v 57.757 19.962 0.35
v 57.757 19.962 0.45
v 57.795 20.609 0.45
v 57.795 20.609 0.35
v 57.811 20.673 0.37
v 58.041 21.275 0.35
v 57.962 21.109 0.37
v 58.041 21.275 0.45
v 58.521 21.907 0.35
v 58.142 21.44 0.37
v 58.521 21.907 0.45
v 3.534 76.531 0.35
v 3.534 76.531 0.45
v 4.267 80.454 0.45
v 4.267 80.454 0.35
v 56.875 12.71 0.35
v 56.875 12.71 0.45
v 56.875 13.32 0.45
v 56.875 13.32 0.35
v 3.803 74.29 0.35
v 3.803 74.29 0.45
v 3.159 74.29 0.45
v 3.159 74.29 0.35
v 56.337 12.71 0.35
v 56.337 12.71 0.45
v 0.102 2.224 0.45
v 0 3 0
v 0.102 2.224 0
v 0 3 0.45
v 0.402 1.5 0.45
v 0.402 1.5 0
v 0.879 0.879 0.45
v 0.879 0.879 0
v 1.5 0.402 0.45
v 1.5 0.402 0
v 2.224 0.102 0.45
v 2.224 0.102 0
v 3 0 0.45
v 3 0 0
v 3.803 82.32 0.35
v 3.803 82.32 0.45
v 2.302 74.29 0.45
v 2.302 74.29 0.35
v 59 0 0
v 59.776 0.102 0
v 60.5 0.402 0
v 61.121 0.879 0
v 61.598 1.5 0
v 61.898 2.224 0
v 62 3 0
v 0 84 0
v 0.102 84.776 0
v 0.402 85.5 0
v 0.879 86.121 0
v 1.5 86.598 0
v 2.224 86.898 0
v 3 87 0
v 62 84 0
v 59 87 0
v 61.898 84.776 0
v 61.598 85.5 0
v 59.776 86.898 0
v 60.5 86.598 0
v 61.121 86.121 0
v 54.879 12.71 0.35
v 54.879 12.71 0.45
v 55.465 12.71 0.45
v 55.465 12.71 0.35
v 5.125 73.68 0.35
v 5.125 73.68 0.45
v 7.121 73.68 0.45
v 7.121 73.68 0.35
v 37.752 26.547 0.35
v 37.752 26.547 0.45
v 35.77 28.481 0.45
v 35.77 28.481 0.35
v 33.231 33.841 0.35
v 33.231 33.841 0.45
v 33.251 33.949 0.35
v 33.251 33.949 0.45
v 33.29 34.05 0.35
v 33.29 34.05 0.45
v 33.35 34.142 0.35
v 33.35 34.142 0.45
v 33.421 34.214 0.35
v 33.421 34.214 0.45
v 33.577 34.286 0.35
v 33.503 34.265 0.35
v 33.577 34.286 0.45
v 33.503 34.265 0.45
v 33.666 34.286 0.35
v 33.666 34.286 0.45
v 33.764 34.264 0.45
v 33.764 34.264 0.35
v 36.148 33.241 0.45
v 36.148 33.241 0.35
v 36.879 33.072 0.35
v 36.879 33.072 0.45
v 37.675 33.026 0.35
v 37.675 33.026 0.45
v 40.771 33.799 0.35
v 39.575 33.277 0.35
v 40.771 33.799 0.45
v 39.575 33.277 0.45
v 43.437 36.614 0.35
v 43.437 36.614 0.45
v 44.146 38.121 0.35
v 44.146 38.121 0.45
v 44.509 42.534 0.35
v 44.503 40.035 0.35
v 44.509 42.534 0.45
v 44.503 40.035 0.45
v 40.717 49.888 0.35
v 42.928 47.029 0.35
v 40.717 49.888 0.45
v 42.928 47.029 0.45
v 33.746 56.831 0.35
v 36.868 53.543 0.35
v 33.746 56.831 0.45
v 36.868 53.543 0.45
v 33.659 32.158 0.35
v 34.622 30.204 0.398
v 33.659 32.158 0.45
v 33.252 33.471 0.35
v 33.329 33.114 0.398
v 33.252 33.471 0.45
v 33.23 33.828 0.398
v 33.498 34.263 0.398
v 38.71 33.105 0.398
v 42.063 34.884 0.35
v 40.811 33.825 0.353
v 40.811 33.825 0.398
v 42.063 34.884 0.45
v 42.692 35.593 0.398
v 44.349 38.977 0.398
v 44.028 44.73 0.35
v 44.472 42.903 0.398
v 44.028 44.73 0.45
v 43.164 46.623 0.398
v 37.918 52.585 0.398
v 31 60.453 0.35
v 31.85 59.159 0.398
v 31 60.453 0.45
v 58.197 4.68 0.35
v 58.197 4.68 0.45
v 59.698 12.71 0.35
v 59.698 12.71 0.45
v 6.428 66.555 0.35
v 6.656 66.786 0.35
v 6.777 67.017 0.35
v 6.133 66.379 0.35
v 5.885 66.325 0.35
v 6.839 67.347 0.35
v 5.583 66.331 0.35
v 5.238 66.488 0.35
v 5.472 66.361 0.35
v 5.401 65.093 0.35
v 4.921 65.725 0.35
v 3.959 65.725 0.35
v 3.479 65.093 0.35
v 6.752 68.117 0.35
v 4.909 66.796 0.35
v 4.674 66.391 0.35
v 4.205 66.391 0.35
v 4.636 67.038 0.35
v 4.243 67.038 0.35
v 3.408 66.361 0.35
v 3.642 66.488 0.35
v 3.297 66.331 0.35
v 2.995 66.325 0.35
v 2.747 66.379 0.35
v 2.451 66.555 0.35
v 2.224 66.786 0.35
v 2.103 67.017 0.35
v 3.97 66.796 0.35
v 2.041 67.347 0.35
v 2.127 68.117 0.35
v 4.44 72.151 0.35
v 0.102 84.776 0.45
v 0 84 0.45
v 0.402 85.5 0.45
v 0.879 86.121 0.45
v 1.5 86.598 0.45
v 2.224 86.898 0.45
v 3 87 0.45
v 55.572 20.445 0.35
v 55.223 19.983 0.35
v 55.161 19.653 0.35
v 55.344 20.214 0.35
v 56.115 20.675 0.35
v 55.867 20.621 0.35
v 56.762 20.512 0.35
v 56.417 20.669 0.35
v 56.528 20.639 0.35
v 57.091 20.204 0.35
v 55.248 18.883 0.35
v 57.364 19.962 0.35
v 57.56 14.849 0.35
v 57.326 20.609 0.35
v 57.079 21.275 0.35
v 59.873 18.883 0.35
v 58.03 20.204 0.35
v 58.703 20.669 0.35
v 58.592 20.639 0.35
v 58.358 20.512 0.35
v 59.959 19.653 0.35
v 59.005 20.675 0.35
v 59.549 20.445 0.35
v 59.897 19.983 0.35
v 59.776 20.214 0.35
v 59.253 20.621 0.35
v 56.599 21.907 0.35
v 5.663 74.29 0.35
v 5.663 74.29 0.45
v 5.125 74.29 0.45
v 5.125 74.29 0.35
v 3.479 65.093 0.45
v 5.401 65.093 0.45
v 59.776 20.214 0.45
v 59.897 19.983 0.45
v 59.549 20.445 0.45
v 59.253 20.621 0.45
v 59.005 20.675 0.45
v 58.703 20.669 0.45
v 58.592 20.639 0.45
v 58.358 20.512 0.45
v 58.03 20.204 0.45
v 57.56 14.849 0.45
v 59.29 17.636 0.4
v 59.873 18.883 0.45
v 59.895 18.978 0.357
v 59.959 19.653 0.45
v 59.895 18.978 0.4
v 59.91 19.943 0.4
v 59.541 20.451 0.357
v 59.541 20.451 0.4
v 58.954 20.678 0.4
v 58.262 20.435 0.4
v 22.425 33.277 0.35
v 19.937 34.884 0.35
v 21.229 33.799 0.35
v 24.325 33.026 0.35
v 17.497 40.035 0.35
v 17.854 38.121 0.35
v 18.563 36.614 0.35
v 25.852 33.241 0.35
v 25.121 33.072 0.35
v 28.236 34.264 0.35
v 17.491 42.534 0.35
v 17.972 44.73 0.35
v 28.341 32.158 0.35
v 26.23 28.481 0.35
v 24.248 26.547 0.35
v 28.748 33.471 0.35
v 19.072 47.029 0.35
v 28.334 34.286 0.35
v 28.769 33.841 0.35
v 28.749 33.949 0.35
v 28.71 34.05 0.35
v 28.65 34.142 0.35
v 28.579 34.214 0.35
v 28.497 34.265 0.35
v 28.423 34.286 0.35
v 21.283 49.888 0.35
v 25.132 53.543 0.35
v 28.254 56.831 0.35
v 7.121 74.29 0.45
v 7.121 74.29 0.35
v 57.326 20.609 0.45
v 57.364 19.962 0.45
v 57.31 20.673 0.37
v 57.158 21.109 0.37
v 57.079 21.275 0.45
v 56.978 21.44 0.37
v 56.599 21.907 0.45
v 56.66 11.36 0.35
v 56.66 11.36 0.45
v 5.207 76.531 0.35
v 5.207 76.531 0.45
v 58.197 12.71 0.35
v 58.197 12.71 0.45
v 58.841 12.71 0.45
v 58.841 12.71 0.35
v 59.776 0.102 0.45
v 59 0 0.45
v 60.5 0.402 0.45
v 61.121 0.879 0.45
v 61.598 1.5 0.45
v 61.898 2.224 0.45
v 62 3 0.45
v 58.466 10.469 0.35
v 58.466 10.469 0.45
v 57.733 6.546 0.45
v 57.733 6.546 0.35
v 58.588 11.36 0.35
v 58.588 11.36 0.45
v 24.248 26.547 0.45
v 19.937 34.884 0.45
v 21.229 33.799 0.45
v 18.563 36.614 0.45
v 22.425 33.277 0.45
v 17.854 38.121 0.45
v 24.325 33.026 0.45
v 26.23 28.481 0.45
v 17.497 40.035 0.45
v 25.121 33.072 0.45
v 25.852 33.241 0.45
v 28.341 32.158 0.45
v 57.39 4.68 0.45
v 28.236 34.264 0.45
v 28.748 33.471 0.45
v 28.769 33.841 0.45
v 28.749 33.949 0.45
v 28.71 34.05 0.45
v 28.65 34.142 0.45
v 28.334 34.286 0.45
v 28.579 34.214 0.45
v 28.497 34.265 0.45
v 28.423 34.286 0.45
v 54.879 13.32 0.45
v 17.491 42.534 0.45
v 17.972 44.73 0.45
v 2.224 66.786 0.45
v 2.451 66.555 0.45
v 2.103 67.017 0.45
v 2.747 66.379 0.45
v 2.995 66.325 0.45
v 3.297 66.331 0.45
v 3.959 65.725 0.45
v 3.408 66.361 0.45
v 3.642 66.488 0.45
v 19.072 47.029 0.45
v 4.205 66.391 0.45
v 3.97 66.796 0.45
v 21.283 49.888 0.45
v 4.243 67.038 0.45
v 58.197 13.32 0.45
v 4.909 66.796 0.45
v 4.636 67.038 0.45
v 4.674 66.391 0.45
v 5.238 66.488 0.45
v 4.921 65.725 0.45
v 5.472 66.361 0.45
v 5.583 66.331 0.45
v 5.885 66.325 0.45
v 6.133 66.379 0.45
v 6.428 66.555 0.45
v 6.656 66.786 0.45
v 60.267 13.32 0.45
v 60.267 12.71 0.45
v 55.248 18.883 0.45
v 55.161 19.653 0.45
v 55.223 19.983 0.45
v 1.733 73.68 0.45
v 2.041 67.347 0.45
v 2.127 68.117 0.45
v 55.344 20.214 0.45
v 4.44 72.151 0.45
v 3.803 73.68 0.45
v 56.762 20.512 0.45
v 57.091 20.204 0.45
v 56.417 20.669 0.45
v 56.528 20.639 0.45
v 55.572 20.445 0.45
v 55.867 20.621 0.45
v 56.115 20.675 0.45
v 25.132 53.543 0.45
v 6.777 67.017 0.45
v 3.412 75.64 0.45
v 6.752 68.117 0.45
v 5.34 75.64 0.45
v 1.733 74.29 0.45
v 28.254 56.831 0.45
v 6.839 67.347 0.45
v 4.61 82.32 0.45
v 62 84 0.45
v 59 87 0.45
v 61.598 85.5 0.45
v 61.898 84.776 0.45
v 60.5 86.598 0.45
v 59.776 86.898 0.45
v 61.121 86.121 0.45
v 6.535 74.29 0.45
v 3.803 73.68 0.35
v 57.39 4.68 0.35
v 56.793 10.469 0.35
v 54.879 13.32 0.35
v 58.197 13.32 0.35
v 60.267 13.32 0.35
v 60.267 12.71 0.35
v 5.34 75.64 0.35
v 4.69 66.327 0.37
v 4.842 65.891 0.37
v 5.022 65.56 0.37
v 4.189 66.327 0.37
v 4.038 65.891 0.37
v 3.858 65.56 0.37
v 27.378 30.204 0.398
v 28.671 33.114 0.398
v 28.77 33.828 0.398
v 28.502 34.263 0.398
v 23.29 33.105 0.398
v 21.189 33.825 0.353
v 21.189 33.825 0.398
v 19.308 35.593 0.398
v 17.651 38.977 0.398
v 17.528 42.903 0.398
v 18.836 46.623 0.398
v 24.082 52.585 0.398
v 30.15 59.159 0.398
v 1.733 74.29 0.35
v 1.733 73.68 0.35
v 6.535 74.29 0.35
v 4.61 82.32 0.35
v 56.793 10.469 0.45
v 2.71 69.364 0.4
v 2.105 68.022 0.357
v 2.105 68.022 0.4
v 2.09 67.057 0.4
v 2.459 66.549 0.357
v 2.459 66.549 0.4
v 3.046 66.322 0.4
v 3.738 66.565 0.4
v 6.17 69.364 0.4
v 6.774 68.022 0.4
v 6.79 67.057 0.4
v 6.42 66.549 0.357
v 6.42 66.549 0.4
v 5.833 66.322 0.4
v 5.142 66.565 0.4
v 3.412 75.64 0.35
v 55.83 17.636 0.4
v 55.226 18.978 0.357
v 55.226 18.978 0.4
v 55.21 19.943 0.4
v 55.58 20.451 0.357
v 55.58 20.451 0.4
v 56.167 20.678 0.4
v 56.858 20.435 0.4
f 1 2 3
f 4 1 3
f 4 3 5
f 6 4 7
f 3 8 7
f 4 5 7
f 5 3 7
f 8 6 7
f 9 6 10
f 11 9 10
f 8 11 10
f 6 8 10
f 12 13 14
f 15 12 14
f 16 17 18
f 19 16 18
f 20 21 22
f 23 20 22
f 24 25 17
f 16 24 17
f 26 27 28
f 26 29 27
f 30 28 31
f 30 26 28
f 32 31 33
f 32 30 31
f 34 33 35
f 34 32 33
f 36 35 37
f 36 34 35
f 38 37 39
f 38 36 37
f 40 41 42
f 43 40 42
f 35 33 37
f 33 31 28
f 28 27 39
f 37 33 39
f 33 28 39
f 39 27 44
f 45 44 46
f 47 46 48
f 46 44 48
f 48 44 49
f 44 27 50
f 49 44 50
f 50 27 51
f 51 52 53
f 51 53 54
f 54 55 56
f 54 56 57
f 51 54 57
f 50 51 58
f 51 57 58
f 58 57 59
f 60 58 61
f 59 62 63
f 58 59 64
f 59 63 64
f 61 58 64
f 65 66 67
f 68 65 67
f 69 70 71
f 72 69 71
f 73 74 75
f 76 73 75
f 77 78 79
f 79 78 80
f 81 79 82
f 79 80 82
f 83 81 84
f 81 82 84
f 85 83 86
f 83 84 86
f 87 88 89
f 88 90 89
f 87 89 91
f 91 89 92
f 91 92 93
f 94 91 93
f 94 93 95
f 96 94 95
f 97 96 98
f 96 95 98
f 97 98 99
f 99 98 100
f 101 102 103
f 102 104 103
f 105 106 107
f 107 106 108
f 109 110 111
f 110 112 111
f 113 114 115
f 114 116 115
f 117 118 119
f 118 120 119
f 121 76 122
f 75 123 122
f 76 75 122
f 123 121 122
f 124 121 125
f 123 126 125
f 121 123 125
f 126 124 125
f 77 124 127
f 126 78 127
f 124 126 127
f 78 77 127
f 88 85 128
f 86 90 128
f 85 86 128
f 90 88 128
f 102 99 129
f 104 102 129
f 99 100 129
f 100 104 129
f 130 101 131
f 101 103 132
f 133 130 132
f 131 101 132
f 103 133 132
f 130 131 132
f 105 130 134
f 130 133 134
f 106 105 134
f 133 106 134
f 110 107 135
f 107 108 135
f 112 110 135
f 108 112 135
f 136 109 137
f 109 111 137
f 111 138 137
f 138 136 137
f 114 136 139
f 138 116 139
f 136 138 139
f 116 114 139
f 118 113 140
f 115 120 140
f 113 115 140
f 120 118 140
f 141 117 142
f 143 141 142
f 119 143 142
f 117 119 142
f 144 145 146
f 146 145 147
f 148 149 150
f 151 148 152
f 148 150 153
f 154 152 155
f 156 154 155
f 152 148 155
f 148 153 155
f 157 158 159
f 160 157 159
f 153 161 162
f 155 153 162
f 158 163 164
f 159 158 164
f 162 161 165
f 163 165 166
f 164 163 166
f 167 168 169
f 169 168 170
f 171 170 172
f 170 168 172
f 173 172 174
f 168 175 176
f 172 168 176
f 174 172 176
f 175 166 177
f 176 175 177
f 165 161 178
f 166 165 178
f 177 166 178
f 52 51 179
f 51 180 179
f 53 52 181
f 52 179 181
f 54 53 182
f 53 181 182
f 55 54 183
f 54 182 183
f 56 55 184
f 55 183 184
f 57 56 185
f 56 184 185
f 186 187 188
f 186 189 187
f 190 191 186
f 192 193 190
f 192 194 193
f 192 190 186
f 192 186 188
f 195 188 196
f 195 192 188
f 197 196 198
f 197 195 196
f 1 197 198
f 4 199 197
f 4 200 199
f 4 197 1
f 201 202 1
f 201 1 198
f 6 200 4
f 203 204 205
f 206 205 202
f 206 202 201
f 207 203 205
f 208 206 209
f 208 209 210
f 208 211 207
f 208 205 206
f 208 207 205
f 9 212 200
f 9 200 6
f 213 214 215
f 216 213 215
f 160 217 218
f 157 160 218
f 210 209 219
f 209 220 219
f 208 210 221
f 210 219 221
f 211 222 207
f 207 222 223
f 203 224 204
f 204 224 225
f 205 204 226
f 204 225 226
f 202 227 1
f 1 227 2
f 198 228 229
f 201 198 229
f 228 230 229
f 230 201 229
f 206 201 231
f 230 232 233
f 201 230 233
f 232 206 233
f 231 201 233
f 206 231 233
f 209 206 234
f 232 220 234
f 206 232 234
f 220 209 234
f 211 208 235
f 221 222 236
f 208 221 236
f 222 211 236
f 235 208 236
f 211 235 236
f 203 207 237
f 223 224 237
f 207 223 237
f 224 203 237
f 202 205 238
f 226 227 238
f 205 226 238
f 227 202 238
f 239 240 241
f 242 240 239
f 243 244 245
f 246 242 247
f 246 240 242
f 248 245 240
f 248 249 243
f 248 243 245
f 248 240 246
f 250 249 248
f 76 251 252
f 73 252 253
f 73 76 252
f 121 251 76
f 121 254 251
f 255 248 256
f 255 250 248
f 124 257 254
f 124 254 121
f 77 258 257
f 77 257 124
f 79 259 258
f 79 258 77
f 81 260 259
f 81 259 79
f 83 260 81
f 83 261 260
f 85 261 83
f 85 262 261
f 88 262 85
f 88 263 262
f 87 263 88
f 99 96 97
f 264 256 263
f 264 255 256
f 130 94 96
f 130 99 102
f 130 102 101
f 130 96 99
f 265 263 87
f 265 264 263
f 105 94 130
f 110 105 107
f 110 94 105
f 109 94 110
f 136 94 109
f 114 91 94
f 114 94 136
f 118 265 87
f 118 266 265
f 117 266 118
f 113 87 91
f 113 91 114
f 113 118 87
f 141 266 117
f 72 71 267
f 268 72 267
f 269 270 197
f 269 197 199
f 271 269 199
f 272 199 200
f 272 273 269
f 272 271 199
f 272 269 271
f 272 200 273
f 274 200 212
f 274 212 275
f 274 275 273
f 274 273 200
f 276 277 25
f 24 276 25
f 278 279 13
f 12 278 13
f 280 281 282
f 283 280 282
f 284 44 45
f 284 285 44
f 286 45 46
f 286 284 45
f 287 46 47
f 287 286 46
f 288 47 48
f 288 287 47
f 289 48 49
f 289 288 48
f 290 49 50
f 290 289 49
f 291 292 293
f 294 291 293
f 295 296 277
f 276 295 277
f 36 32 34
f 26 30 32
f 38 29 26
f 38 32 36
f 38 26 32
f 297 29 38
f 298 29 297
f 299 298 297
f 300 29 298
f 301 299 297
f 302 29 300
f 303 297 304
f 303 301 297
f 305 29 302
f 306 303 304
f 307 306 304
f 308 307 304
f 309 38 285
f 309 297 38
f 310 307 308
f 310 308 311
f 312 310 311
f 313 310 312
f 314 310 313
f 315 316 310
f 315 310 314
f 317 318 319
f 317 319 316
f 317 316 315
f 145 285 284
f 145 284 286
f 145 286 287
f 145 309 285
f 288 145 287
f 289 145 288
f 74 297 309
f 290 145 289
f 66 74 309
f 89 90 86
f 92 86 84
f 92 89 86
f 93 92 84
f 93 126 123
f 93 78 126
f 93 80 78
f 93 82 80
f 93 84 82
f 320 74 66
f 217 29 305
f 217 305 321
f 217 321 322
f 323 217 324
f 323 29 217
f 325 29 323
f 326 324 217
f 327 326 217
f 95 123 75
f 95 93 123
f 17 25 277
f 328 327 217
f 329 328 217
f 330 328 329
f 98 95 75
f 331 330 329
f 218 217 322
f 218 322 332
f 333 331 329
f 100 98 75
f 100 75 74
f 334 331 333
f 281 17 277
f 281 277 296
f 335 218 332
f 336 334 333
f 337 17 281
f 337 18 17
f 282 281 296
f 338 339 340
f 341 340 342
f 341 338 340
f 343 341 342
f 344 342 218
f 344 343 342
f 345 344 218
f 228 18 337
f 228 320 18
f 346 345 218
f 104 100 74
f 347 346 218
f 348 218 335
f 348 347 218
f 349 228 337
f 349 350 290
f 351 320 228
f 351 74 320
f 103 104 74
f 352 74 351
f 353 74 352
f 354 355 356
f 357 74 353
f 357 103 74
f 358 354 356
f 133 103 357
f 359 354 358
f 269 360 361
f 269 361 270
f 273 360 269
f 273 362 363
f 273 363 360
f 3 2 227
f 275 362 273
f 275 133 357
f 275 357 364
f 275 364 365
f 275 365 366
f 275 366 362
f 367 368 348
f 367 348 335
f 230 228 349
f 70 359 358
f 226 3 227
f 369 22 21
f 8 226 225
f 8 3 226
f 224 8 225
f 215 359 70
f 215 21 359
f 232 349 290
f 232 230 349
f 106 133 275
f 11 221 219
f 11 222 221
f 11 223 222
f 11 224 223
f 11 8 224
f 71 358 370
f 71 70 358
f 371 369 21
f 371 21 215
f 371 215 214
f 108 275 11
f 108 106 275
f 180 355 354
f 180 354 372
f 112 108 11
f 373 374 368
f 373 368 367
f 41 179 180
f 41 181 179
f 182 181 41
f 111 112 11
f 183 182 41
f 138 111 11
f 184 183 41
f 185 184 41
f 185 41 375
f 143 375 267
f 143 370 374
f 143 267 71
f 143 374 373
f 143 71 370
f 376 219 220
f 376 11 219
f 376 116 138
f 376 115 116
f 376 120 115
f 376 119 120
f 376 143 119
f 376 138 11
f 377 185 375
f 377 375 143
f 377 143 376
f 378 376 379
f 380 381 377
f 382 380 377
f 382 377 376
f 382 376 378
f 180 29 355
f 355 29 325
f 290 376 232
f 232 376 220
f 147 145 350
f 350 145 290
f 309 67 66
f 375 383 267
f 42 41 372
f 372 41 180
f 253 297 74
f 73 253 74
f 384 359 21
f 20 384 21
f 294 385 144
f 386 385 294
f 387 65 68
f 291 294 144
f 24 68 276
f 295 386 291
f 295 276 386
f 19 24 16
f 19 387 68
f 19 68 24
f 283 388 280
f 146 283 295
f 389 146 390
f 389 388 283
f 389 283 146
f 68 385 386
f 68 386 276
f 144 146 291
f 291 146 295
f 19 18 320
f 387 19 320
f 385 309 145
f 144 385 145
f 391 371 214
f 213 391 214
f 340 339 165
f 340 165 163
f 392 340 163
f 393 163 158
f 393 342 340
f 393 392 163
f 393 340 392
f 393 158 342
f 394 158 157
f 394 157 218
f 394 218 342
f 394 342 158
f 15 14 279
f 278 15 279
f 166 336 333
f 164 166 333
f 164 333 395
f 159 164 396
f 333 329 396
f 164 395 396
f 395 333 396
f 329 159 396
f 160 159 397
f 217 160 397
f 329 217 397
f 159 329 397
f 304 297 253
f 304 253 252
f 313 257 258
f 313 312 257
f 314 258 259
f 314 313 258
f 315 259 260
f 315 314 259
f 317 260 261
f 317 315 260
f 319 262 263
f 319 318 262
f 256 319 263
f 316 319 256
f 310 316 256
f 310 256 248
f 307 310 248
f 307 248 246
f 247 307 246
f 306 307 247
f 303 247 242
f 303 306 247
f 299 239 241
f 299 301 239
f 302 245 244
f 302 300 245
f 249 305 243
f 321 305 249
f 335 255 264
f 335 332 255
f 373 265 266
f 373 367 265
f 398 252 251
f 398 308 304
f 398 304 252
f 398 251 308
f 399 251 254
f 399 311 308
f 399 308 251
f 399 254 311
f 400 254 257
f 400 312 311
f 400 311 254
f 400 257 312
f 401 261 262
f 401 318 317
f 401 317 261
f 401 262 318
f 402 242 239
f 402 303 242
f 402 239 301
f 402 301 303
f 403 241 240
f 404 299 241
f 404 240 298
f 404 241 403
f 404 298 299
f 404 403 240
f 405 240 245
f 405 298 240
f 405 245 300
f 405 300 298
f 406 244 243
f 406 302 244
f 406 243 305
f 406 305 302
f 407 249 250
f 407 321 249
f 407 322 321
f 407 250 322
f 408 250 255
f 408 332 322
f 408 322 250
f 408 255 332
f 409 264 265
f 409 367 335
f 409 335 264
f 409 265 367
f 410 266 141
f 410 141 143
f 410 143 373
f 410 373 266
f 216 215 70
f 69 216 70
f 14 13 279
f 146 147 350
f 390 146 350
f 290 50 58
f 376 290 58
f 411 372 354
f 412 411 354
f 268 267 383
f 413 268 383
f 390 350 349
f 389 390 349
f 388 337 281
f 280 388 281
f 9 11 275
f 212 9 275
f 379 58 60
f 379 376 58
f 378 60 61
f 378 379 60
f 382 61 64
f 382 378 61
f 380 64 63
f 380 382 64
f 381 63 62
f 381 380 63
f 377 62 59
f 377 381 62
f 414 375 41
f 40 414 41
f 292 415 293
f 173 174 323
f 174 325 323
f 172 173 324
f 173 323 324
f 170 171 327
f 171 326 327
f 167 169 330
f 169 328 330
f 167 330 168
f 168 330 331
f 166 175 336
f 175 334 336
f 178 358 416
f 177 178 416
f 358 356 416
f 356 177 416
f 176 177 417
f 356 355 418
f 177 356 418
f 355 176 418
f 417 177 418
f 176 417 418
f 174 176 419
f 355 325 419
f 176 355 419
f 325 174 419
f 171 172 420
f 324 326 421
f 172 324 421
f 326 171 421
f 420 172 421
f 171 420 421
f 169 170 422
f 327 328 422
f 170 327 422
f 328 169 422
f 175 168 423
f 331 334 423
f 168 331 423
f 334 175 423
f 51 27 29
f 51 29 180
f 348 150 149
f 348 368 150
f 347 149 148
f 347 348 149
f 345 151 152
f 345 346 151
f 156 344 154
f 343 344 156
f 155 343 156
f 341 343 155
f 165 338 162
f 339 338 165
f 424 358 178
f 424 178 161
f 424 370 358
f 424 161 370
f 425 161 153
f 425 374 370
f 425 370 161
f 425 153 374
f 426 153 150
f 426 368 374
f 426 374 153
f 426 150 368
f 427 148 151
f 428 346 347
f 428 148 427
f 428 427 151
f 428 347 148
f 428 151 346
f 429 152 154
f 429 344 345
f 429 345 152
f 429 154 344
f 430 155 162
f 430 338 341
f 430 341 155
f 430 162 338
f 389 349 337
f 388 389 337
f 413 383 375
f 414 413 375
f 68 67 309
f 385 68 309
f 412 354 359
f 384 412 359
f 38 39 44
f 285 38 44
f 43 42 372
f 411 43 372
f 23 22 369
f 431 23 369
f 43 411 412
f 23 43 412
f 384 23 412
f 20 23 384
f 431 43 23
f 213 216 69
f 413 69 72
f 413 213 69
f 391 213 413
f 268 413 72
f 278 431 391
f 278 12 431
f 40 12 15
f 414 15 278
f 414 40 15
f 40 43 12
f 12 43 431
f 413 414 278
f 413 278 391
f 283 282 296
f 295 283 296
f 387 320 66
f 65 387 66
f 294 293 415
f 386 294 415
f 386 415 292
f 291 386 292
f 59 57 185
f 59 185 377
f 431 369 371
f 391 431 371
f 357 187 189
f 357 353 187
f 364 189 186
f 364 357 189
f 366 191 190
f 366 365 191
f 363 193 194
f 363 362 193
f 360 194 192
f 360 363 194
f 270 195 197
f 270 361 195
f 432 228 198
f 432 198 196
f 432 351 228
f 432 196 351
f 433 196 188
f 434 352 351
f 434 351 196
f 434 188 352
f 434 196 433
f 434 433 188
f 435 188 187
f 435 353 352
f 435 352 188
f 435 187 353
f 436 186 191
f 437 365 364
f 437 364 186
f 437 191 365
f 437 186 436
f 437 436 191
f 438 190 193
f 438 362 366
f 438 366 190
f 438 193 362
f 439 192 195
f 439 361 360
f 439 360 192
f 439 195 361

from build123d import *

# Parameters (mm, degrees)
F0_W     = 62
F0_H     = 87
F1_DEPTH = 0.45
F2_R     = 3
F4_DEPTH = 0.1


with BuildPart() as f1:
    # F0 (on Top) → F1 (new body)
    with BuildSketch(Plane.XY):
        with Locations((31, 43.5)):
            Rectangle(F0_W, F0_H)
    extrude(amount=F1_DEPTH)

    # F2
    f2_edges = [f1.edges().sort_by_distance(p)[0] for p in [
        (62, 87, 0.225),
        (0, 87, 0.225),
        (62, 0, 0.225),
        (0, 0, 0.225),
    ]]
    fillet(f2_edges, radius=F2_R)

    # F3 (on face) → F4 (cut)
    with BuildSketch(Plane.XY.offset(0.45)):
        Polygon((4.6103941277, 82.3198705912), (3.8031477015, 82.3198705912), (2.3018923596, 74.2900818586), (1.7328544054, 74.2900818586), (1.7328544054, 73.6795067787), (3.8031477015, 73.6795067787), (3.8031477015, 74.2900818586), (3.1593375381, 74.2900818586), (3.4117235232, 75.6400228596), (5.3396950772, 75.6400228596), (5.6632163674, 74.2900818586), (5.1254248247, 74.2900818586), (5.1254248247, 73.6795067787), (7.1211797185, 73.6795067787), (7.1211797185, 74.2900818586), (6.5347801634, 74.2900818586), align=None)
        Polygon((4.2673139068, 80.4538051702), (5.2073942497, 76.5311792493), (4.2673139068, 76.5311792493), (3.5339368137, 76.5311792493), align=None, mode=Mode.SUBTRACT)
        with BuildLine():
            add(Edge.make_bspline(
                [(4.4397576712, 72.1507370472), (4.8369145501, 71.5068902989), (5.5292855369, 70.3844602664), (6.1555231929, 69.4098889942), (6.6107708272, 68.5842755704), (6.789836569, 68.0432823133), (6.8610545111, 67.4412662849), (6.8098761533, 67.0597038749), (6.6648616449, 66.7676120775), (6.4288462308, 66.5406602614), (6.1311650078, 66.3535576479), (5.8326713897, 66.3143937609), (5.4900916417, 66.3175318752), (5.1270691768, 66.5477607577), (4.8566693677, 66.8658952105), (4.7043084678, 66.985193797), (4.6362685971, 67.0384690166)],
                knots=[0, 0, 0, 0, 0.1413861968, 0.2464811911, 0.3388139078, 0.4126339875, 0.4874177284, 0.5474256046, 0.6016438112, 0.6571822255, 0.7142256067, 0.767096188, 0.8229434379, 0.8861232936, 0.9491460317, 1, 1, 1, 1], degree=3))
            add(Edge.make_bspline(
                [(4.4397576712, 72.1507370472), (4.0426007923, 71.5068902989), (3.3502298055, 70.3844602664), (2.7239921495, 69.4098889942), (2.2687445152, 68.5842755704), (2.0896787734, 68.0432823133), (2.0184608313, 67.4412662849), (2.0696391891, 67.0597038749), (2.2146536975, 66.7676120775), (2.4506691116, 66.5406602614), (2.7483503346, 66.3535576479), (3.0468439527, 66.3143937609), (3.3894237007, 66.3175318752), (3.7524461656, 66.5477607577), (4.0228459747, 66.8658952105), (4.1752068746, 66.985193797), (4.2432467453, 67.0384690166)],
                knots=[0, 0, 0, 0, 0.1413861968, 0.2464811911, 0.3388139078, 0.4126339875, 0.4874177284, 0.5474256046, 0.6016438112, 0.6571822255, 0.7142256067, 0.767096188, 0.8229434379, 0.8861232936, 0.9491460317, 1, 1, 1, 1], degree=3))
            add(Edge.make_bspline(
                [(4.2432467453, 67.0384690166), (4.2469012325, 66.9051732952), (4.2539335567, 66.6486725412), (4.2012975101, 66.3274602971), (4.0424245957, 65.8783252744), (3.8709793065, 65.5478520579), (3.6192358104, 65.2556407798), (3.4787429031, 65.0925636292)],
                knots=[0, 0, 0, 0, 0.1902938575, 0.3661821807, 0.5742482312, 0.762396627, 1, 1, 1, 1], degree=3))
            Line((3.4787429031, 65.0925636292), (4.4397576712, 65.0925636292))
            Line((4.4397576712, 65.0925636292), (5.4007724393, 65.0925636292))
            add(Edge.make_bspline(
                [(4.6362685971, 67.0384690166), (4.6326141099, 66.9051732952), (4.6255817857, 66.6486725412), (4.6782178323, 66.3274602971), (4.8370907467, 65.8783252744), (5.0085360359, 65.5478520579), (5.260279532, 65.2556407798), (5.4007724393, 65.0925636292)],
                knots=[0, 0, 0, 0, 0.1902938575, 0.3661821807, 0.5742482312, 0.762396627, 1, 1, 1, 1], degree=3))
        make_face()
        with BuildLine():
            Line((24.2479877025, 26.5474453047), (31, 26.5474453047))
            Line((31, 26.5474453047), (37.7520122975, 26.5474453047))
            add(Edge.make_bspline(
                [(37.7520122975, 26.5474453047), (37.6285922228, 26.6330701862), (37.3239473836, 26.8444229855), (36.5023203914, 27.624925569), (35.7882272753, 28.4012554118), (34.5641456845, 30.1774827346), (33.6593789157, 32.0825849842), (33.3233761896, 33.0622333593), (33.2013599801, 33.7055421015), (33.2568475405, 34.0527966037), (33.4864333596, 34.3041497616), (33.8035109219, 34.2875459005), (34.393194582, 33.9368602847), (35.5320147451, 33.455110111), (36.8230901421, 32.9732274531), (38.7629791298, 33.0415858862), (40.7756043574, 33.5462706003), (42.7540793615, 35.5268071748), (43.9871696191, 37.4063846685), (44.3828189525, 38.979359688), (44.6130448781, 40.772338461), (44.5174096792, 42.9397415092), (44.1901372791, 44.4792519057), (43.2021638277, 46.6761153271), (42.3711591631, 47.8592737778), (41.1980934518, 49.4117717221), (39.7775727263, 50.8717205708), (37.900130737, 52.6127775248), (36.3211736387, 54.0160814099), (34.4192252668, 56.0084642945), (32.9444463756, 57.7920718618), (31.8320484739, 59.1215940483), (31.2727060043, 60.0163289569), (31, 60.4525546953)],
                knots=[0, 0, 0, 0, 0.0187392883, 0.0462552587, 0.0737393157, 0.1125276879, 0.1513043263, 0.177995482, 0.1986777803, 0.2139429813, 0.2283008004, 0.242019082, 0.2634389677, 0.2928162763, 0.3238339572, 0.3599975019, 0.3977159243, 0.4414772137, 0.4809470013, 0.5139111701, 0.5494313129, 0.5878403025, 0.6215467466, 0.6617535814, 0.6939579857, 0.7299795678, 0.7681153417, 0.8099616704, 0.8486825995, 0.8923578767, 0.9327331618, 0.9672042234, 1, 1, 1, 1], degree=3))
            add(Edge.make_bspline(
                [(24.2479877025, 26.5474453047), (24.3714077772, 26.6330701862), (24.6760526164, 26.8444229855), (25.4976796086, 27.624925569), (26.2117727247, 28.4012554118), (27.4358543155, 30.1774827346), (28.3406210843, 32.0825849842), (28.6766238104, 33.0622333593), (28.7986400199, 33.7055421015), (28.7431524595, 34.0527966037), (28.5135666404, 34.3041497616), (28.1964890781, 34.2875459005), (27.606805418, 33.9368602847), (26.4679852549, 33.455110111), (25.1769098579, 32.9732274531), (23.2370208702, 33.0415858862), (21.2243956426, 33.5462706003), (19.2459206385, 35.5268071748), (18.0128303809, 37.4063846685), (17.6171810475, 38.979359688), (17.3869551219, 40.772338461), (17.4825903208, 42.9397415092), (17.8098627209, 44.4792519057), (18.7978361723, 46.6761153271), (19.6288408369, 47.8592737778), (20.8019065482, 49.4117717221), (22.2224272737, 50.8717205708), (24.099869263, 52.6127775248), (25.6788263613, 54.0160814099), (27.5807747332, 56.0084642945), (29.0555536244, 57.7920718618), (30.1679515261, 59.1215940483), (30.7272939957, 60.0163289569), (31, 60.4525546953)],
                knots=[0, 0, 0, 0, 0.0187392883, 0.0462552587, 0.0737393157, 0.1125276879, 0.1513043263, 0.177995482, 0.1986777803, 0.2139429813, 0.2283008004, 0.242019082, 0.2634389677, 0.2928162763, 0.3238339572, 0.3599975019, 0.3977159243, 0.4414772137, 0.4809470013, 0.5139111701, 0.5494313129, 0.5878403025, 0.6215467466, 0.6617535814, 0.6939579857, 0.7299795678, 0.7681153417, 0.8099616704, 0.8486825995, 0.8923578767, 0.9327331618, 0.9672042234, 1, 1, 1, 1], degree=3))
        make_face()
        Polygon((60.2671455946, 12.7099181414), (60.2671455946, 13.3204932213), (58.1968522985, 13.3204932213), (58.1968522985, 12.7099181414), (58.8406624619, 12.7099181414), (58.5882764768, 11.3599771404), (56.6603049228, 11.3599771404), (56.3367836326, 12.7099181414), (56.8745751753, 12.7099181414), (56.8745751753, 13.3204932213), (54.8788202815, 13.3204932213), (54.8788202815, 12.7099181414), (55.4652198366, 12.7099181414), (57.3896058723, 4.6801294088), (58.1968522985, 4.6801294088), (59.6981076404, 12.7099181414), align=None)
        Polygon((57.7326860932, 6.5461948298), (56.7926057503, 10.4688207507), (57.7326860932, 10.4688207507), (58.4660631863, 10.4688207507), align=None, mode=Mode.SUBTRACT)
        with BuildLine():
            Line((58.5212570969, 21.9074363708), (57.5602423288, 21.9074363708))
            Line((57.5602423288, 21.9074363708), (56.5992275607, 21.9074363708))
            add(Edge.make_bspline(
                [(57.3637314029, 19.9615309834), (57.3673858901, 20.0948267048), (57.3744182143, 20.3513274588), (57.3217821677, 20.6725397029), (57.1629092533, 21.1216747256), (56.9914639641, 21.4521479421), (56.739720468, 21.7443592202), (56.5992275607, 21.9074363708)],
                knots=[0, 0, 0, 0, 0.1902938575, 0.3661821807, 0.5742482312, 0.762396627, 1, 1, 1, 1], degree=3))
            add(Edge.make_bspline(
                [(57.5602423288, 14.8492629528), (57.1630854499, 15.4931097011), (56.4707144631, 16.6155397336), (55.8444768071, 17.5901110058), (55.3892291728, 18.4157244296), (55.210163431, 18.9567176867), (55.1389454889, 19.5587337151), (55.1901238467, 19.9402961251), (55.3351383551, 20.2323879225), (55.5711537692, 20.4593397386), (55.8688349922, 20.6464423521), (56.1673286103, 20.6856062391), (56.5099083583, 20.6824681248), (56.8729308232, 20.4522392423), (57.1433306323, 20.1341047895), (57.2956915322, 20.014806203), (57.3637314029, 19.9615309834)],
                knots=[0, 0, 0, 0, 0.1413861968, 0.2464811911, 0.3388139078, 0.4126339875, 0.4874177284, 0.5474256046, 0.6016438112, 0.6571822255, 0.7142256067, 0.767096188, 0.8229434379, 0.8861232936, 0.9491460317, 1, 1, 1, 1], degree=3))
            add(Edge.make_bspline(
                [(57.5602423288, 14.8492629528), (57.9573992077, 15.4931097011), (58.6497701945, 16.6155397336), (59.2760078505, 17.5901110058), (59.7312554848, 18.4157244296), (59.9103212266, 18.9567176867), (59.9815391687, 19.5587337151), (59.9303608109, 19.9402961251), (59.7853463025, 20.2323879225), (59.5493308884, 20.4593397386), (59.2516496654, 20.6464423521), (58.9531560473, 20.6856062391), (58.6105762993, 20.6824681248), (58.2475538344, 20.4522392423), (57.9771540253, 20.1341047895), (57.8247931254, 20.014806203), (57.7567532547, 19.9615309834)],
                knots=[0, 0, 0, 0, 0.1413861968, 0.2464811911, 0.3388139078, 0.4126339875, 0.4874177284, 0.5474256046, 0.6016438112, 0.6571822255, 0.7142256067, 0.767096188, 0.8229434379, 0.8861232936, 0.9491460317, 1, 1, 1, 1], degree=3))
            add(Edge.make_bspline(
                [(57.7567532547, 19.9615309834), (57.7530987675, 20.0948267048), (57.7460664433, 20.3513274588), (57.7987024899, 20.6725397029), (57.9575754043, 21.1216747256), (58.1290206935, 21.4521479421), (58.3807641896, 21.7443592202), (58.5212570969, 21.9074363708)],
                knots=[0, 0, 0, 0, 0.1902938575, 0.3661821807, 0.5742482312, 0.762396627, 1, 1, 1, 1], degree=3))
        make_face()
    extrude(amount=-F4_DEPTH, mode=Mode.SUBTRACT)


solid = f1.part
